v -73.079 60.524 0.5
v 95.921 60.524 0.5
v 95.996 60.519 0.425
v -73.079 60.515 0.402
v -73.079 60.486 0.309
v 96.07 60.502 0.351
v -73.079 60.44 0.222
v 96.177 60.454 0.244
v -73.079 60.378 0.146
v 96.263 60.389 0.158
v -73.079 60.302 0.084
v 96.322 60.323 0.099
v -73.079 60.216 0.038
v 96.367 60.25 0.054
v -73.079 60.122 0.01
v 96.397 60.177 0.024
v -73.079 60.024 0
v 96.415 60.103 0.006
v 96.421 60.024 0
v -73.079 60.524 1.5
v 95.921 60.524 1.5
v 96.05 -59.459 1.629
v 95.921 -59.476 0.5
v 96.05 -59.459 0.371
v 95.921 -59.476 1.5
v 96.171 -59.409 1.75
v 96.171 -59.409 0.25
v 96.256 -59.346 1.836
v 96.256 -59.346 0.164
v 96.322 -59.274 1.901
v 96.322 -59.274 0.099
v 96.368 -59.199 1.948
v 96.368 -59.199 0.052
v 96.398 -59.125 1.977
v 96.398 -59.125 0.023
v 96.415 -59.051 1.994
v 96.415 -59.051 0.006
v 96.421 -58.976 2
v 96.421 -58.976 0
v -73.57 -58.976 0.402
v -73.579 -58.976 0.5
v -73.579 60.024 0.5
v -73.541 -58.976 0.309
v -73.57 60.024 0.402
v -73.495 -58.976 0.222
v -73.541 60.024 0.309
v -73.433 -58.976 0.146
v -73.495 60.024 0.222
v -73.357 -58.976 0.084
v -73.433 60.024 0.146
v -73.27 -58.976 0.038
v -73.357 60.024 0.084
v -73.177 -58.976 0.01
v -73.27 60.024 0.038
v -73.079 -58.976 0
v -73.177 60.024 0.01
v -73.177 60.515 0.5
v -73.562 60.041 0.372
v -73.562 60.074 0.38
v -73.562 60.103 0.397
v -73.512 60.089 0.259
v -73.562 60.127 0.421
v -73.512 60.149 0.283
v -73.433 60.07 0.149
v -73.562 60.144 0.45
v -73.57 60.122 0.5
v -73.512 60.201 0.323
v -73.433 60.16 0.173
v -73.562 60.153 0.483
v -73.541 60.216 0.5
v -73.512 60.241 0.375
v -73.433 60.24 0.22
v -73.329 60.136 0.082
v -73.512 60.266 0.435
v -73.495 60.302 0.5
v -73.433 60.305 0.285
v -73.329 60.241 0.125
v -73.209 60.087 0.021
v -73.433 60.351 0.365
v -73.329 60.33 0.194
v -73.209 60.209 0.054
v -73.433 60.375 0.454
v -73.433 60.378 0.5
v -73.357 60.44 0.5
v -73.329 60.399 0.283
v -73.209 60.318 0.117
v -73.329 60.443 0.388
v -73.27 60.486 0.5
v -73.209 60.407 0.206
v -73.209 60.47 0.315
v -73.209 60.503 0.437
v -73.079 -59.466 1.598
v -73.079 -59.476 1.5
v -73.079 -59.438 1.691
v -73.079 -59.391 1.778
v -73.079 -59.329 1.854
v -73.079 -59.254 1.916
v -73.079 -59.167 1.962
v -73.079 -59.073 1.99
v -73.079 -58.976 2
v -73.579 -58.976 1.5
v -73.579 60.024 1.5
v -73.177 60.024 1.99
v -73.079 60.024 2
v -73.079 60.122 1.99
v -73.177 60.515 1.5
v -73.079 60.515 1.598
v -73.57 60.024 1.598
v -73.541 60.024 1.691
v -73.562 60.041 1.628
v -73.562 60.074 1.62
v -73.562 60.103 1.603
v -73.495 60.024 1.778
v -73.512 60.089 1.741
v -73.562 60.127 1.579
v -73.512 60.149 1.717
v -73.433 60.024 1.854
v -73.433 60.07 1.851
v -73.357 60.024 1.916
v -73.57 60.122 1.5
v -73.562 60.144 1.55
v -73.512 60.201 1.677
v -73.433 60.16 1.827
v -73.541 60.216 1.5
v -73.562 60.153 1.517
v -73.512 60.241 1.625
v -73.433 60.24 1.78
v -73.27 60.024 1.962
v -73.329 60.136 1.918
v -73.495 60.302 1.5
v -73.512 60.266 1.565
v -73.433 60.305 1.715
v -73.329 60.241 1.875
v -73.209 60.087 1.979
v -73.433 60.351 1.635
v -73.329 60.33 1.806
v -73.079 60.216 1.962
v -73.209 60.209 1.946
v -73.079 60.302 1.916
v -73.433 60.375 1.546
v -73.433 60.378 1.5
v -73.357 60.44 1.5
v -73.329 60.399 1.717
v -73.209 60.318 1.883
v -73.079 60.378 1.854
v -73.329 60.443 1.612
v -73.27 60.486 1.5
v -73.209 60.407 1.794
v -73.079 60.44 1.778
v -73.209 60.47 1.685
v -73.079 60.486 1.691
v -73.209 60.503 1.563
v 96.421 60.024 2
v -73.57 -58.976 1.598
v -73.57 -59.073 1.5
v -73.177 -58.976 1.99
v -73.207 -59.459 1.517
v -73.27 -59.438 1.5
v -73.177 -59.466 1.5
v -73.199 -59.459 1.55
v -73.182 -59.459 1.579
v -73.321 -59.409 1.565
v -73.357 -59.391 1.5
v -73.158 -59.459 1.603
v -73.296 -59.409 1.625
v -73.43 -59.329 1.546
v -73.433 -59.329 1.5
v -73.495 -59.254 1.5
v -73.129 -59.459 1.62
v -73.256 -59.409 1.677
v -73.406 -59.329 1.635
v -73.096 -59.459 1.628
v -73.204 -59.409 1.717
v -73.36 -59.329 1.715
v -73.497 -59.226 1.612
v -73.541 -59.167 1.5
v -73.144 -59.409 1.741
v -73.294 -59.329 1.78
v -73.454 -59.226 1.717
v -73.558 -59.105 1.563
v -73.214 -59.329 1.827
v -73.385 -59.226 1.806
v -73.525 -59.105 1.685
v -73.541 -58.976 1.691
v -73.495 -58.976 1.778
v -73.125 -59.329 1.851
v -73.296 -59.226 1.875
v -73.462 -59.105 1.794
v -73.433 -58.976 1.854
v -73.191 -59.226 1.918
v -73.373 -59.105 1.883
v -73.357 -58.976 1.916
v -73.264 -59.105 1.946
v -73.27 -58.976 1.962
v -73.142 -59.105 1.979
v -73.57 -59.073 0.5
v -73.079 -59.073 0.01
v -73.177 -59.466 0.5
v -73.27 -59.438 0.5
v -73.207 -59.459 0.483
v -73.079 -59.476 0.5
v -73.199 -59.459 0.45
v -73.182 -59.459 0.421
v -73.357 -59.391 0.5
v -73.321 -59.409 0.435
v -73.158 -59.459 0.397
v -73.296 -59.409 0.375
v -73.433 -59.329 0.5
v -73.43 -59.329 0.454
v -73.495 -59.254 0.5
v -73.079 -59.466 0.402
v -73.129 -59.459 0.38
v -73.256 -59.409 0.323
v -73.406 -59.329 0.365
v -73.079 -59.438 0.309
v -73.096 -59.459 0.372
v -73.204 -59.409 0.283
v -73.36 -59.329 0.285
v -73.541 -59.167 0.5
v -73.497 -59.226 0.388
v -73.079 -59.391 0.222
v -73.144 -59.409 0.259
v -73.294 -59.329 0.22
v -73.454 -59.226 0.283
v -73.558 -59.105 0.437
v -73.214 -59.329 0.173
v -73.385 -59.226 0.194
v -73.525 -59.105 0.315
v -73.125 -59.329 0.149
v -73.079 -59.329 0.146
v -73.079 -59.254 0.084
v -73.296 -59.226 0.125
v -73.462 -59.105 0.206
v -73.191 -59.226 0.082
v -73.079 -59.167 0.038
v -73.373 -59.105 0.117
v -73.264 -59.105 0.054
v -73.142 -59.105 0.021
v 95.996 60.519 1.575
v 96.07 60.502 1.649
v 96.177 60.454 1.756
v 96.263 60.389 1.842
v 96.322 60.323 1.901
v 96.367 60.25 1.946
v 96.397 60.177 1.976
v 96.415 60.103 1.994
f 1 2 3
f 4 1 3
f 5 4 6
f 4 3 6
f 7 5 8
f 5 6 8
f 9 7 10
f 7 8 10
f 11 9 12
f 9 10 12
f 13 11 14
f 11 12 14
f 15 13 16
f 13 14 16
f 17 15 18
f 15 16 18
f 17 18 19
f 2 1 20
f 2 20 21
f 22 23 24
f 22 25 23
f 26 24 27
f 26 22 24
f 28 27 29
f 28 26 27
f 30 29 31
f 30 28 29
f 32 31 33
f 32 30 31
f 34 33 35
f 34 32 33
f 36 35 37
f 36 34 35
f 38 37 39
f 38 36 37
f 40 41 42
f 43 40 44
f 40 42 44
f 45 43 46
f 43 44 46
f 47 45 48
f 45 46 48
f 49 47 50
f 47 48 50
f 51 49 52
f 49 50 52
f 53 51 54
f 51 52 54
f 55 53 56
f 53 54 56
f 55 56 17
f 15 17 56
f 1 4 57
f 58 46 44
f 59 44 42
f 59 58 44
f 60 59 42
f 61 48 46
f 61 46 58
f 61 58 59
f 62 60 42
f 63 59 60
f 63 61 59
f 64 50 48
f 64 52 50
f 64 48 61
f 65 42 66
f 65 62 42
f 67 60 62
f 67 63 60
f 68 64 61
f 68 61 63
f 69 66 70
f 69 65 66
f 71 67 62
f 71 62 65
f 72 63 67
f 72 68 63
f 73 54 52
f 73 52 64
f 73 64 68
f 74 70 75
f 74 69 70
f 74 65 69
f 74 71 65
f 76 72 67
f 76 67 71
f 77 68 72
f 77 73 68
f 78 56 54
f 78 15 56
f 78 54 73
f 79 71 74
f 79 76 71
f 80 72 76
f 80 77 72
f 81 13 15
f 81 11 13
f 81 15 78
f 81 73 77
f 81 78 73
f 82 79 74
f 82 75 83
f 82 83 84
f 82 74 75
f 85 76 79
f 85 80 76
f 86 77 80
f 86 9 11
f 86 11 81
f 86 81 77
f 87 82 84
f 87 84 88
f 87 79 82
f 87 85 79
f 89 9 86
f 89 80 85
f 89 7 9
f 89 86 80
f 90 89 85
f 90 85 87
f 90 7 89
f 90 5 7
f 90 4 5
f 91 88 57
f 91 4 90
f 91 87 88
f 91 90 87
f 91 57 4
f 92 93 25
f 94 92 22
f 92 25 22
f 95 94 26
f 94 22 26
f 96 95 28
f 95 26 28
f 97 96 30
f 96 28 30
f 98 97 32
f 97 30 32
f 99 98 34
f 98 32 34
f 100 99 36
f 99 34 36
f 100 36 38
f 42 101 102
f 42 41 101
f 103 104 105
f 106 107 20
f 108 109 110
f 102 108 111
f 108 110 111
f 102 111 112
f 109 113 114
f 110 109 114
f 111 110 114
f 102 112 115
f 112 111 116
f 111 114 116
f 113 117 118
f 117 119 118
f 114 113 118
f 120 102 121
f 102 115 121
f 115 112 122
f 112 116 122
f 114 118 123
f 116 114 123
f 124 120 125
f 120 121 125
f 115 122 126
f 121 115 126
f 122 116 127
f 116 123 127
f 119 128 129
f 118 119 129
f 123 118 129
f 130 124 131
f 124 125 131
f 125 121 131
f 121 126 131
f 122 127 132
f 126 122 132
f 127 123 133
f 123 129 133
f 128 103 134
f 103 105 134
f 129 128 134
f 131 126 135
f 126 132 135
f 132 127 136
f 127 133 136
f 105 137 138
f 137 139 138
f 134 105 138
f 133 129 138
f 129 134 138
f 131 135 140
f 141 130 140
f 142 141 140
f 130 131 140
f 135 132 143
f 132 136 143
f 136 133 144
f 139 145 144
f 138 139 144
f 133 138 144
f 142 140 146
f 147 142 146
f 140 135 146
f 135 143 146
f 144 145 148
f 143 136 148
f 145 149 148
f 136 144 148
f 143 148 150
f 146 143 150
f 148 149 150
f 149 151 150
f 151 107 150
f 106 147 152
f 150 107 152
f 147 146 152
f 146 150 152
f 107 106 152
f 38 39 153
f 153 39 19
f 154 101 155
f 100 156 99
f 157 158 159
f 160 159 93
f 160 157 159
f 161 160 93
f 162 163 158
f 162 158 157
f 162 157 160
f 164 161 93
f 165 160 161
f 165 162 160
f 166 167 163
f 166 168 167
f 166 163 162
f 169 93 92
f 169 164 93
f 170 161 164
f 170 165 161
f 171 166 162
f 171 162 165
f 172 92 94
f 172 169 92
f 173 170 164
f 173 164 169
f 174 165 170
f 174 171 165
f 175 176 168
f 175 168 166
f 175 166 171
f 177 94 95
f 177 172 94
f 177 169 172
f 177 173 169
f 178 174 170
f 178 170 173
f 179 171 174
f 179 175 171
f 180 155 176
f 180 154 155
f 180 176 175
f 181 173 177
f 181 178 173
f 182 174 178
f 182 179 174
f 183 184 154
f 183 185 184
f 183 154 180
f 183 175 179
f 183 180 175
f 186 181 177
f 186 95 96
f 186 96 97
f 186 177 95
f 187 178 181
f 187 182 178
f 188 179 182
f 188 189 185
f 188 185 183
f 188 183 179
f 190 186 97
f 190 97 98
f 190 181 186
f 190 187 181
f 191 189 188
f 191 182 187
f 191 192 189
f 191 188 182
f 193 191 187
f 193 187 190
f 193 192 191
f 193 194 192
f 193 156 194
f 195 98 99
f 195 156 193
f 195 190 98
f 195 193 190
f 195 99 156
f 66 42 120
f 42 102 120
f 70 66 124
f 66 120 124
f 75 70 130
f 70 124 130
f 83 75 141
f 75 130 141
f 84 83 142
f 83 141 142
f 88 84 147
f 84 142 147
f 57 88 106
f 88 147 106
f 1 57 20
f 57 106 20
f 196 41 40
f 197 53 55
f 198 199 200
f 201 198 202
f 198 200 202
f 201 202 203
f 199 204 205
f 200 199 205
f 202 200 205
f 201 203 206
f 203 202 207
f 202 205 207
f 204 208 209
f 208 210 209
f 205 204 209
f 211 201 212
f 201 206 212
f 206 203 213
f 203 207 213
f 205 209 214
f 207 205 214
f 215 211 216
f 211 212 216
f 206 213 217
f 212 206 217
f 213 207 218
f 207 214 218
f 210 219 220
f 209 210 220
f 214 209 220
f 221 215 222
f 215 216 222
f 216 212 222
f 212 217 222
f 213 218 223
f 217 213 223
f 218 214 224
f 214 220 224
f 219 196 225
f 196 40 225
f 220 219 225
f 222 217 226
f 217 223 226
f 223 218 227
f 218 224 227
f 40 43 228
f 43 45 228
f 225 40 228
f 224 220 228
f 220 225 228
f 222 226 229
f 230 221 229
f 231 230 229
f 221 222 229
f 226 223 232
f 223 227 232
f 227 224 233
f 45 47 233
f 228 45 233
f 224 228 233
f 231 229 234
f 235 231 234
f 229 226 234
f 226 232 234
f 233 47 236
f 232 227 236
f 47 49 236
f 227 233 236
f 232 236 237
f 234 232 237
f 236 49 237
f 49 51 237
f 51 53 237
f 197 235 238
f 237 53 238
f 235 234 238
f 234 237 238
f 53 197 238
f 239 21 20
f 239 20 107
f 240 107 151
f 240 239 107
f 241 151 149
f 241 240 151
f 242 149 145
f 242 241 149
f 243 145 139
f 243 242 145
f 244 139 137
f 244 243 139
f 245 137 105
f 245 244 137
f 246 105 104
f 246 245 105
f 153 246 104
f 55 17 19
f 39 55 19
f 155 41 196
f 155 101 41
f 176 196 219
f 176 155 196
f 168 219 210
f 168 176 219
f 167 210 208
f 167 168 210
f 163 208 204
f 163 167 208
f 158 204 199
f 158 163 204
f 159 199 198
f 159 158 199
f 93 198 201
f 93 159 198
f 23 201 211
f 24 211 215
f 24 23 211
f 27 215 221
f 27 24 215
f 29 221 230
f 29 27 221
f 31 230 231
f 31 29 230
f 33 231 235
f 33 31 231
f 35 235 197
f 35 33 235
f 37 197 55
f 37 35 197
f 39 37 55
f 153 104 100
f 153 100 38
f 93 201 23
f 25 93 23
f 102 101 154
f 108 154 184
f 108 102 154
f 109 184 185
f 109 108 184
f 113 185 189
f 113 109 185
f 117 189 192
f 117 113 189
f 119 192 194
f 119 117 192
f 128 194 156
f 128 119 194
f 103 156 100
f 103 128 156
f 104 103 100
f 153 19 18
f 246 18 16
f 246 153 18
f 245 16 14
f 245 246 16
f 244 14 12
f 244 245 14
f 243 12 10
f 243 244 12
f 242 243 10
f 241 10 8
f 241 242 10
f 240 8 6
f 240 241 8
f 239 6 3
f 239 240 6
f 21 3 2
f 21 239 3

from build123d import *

# Parameters (mm, degrees)
SKETCH_W  = 170
SKETCH_H  = 120
PAD_DEPTH = 2
FILLET_R  = 0.5


with BuildPart() as part:
    # Sketch → Pad (new body)
    with BuildSketch(Plane.XY):
        with Locations((11.420865, 0.524284)):
            Rectangle(SKETCH_W, SKETCH_H)
    extrude(amount=PAD_DEPTH)

    # Fillet
    fillet_edges = [part.edges().sort_by_distance(p)[0] for p in [
        (96.420865, -59.475716, 1),
        (96.420865, 60.524284, 1),
        (11.420865, 60.524284, 0),
        (11.420865, 60.524284, 2),
        (-73.579135, 0.524284, 2),
        (-73.579135, 0.524284, 0),
        (-73.579135, -59.475716, 1),
        (-73.579135, 60.524284, 1),
        (11.420865, -59.475716, 0),
        (11.420865, -59.475716, 2),
    ]]
    fillet(fillet_edges, radius=FILLET_R)


solid = part.part
